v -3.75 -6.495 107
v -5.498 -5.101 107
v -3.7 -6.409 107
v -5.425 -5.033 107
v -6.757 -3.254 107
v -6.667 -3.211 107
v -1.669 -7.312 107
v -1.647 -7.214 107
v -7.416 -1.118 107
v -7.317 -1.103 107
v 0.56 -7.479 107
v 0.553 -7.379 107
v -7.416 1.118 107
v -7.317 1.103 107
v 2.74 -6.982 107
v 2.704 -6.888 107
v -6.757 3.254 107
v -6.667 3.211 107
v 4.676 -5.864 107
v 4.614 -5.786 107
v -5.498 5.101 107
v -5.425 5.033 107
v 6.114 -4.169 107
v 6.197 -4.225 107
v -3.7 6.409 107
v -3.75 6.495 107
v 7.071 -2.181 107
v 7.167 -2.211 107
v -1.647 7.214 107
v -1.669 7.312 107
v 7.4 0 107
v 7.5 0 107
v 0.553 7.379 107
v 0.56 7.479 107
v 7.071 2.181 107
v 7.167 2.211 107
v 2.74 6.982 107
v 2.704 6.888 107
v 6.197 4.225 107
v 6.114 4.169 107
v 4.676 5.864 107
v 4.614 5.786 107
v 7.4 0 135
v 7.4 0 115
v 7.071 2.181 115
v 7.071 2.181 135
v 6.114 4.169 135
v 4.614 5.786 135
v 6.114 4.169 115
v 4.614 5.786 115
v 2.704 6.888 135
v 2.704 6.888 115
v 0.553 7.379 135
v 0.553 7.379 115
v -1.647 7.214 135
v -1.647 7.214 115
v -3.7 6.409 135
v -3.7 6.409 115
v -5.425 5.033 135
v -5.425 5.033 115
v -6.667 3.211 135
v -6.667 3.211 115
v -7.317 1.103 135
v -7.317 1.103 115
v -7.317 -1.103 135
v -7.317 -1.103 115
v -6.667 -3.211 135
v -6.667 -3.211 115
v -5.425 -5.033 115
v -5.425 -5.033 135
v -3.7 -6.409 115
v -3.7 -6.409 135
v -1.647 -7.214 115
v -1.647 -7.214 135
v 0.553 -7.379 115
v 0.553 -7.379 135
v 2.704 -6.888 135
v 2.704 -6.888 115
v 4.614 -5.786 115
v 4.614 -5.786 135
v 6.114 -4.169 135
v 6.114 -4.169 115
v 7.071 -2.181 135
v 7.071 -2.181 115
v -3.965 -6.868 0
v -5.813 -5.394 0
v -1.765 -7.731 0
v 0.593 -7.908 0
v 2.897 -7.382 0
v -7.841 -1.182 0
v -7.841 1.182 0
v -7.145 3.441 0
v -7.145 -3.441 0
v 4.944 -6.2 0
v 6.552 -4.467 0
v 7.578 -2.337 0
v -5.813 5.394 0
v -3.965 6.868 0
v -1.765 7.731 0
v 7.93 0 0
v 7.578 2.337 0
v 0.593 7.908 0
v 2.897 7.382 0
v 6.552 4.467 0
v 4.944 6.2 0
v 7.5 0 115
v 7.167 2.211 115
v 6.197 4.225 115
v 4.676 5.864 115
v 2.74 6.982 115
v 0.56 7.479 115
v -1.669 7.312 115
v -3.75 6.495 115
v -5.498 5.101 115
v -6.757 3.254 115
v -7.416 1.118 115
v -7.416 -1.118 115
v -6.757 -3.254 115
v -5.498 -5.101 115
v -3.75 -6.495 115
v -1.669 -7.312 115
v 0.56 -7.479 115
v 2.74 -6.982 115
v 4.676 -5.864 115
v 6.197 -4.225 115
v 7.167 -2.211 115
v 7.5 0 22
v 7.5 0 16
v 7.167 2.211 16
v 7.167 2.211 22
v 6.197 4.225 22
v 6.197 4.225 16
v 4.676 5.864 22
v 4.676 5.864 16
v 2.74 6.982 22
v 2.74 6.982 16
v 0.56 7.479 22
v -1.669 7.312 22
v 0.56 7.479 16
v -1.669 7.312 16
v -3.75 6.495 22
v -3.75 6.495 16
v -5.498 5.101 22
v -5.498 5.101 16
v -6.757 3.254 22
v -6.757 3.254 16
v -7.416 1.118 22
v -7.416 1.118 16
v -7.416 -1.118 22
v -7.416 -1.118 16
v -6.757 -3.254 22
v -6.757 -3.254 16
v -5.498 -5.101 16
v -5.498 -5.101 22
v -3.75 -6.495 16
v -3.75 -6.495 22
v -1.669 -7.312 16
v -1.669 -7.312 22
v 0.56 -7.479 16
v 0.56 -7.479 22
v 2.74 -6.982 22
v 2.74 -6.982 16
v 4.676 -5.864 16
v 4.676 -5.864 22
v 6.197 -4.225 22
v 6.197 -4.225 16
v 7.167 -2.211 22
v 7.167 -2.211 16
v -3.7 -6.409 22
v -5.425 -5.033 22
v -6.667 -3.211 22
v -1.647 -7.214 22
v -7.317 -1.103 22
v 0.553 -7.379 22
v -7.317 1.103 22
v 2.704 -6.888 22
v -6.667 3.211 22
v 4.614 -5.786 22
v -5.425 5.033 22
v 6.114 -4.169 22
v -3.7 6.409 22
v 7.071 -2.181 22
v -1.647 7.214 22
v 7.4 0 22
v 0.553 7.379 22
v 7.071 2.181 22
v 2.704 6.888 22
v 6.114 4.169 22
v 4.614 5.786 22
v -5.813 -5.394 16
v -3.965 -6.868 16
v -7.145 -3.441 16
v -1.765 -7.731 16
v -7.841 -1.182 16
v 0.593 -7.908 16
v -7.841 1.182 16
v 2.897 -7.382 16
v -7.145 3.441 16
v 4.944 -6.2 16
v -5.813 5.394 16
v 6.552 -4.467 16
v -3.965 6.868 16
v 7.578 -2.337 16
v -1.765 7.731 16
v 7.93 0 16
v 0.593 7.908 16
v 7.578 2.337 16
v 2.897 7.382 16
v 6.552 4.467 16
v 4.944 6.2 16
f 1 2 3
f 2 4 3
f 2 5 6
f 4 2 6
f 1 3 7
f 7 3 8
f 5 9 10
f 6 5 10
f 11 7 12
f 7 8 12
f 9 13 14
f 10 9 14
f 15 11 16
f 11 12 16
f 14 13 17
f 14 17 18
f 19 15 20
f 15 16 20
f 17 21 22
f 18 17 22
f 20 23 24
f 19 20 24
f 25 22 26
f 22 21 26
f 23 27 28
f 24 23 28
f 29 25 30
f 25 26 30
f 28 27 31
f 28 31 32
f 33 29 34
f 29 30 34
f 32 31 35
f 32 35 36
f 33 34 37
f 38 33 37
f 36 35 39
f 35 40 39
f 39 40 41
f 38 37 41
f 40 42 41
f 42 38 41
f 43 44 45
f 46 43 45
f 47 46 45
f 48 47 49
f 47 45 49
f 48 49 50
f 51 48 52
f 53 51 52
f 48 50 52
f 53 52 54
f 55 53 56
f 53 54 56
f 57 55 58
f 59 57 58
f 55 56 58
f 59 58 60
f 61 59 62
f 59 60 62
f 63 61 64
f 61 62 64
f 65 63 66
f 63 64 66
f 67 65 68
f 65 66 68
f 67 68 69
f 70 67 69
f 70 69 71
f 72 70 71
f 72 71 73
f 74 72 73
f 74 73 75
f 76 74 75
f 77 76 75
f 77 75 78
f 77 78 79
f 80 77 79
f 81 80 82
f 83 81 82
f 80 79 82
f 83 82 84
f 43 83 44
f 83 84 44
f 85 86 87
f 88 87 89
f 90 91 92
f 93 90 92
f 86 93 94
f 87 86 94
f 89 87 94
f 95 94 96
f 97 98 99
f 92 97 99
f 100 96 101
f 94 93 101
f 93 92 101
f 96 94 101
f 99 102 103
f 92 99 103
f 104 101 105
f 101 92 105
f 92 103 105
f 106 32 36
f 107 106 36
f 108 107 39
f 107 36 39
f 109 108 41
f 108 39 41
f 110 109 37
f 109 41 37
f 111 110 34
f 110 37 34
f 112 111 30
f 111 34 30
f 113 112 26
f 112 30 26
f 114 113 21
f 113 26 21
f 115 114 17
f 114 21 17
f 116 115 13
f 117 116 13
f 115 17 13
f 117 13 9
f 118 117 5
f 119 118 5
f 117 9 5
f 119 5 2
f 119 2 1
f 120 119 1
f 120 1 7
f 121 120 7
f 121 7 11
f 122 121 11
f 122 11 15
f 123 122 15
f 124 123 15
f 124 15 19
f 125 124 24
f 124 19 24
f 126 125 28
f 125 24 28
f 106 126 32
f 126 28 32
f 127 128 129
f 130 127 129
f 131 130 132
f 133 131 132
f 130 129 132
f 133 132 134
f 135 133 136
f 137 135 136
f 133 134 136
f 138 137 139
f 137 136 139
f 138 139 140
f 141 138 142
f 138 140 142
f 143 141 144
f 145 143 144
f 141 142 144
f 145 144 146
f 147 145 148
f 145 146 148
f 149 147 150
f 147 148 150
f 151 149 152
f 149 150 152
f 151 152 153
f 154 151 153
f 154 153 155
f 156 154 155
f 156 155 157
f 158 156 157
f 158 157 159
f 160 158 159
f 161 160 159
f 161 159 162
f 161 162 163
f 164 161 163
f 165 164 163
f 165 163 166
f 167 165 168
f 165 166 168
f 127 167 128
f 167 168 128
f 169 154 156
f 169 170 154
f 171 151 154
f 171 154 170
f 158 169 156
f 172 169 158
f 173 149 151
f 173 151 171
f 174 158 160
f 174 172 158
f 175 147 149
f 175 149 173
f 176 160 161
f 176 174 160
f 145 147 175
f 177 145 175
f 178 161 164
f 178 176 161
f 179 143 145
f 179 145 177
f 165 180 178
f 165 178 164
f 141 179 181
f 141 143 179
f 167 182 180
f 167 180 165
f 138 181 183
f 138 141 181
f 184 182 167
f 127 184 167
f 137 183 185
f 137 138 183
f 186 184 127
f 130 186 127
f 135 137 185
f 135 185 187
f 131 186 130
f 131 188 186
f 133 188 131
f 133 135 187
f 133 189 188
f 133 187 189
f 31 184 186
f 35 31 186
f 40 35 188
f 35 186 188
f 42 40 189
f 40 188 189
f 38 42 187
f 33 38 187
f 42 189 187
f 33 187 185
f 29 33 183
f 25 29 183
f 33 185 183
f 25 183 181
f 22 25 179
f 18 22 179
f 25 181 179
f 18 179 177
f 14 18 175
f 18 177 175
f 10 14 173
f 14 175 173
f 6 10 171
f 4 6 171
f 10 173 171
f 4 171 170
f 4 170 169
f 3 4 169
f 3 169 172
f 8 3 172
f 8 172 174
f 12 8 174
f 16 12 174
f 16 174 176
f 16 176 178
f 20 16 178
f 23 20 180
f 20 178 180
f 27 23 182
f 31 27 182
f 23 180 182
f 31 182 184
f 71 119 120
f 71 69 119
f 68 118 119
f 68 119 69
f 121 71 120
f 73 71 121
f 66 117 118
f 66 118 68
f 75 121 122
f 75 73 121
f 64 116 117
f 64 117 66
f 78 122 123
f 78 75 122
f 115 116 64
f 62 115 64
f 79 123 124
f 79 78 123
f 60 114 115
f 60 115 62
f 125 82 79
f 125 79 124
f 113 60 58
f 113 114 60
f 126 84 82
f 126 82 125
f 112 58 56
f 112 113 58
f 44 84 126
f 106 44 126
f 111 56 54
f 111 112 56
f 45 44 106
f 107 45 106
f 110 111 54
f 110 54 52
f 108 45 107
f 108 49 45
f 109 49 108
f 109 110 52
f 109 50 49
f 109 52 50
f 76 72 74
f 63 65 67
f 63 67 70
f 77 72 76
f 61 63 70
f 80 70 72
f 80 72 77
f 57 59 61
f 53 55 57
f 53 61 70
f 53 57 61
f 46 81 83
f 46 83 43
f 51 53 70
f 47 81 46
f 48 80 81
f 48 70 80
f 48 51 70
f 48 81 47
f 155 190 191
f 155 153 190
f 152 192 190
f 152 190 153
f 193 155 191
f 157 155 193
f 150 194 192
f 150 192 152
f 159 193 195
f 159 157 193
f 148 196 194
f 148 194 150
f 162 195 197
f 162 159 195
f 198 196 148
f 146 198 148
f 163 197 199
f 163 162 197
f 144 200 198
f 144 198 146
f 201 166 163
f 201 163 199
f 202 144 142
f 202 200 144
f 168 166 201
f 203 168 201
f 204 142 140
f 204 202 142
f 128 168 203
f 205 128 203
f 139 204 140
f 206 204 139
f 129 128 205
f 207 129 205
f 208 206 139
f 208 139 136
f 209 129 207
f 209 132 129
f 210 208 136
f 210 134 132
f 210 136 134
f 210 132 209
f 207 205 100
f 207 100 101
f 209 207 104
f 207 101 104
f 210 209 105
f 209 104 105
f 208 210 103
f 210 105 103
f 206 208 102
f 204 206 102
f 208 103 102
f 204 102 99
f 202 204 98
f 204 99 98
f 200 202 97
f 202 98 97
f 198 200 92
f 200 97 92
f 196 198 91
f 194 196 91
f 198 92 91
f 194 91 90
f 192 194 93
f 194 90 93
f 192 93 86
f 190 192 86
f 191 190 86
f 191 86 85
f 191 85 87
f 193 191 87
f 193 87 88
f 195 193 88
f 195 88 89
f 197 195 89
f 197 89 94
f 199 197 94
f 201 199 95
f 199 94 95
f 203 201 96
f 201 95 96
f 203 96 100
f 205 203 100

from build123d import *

# Parameters (mm, degrees)
SKETCH004_R  = 7.93
PAD_DEPTH    = 16
SKETCH005_R  = 7.5
PAD001_DEPTH = 6
SKETCH006_R  = 7.4
PAD002_DEPTH = 85
SKETCH007_R  = 7.5
PAD003_DEPTH = 8
SKETCH008_R  = 7.4
PAD004_DEPTH = 20


with BuildPart() as part:
    # Sketch004 → Pad (new body)
    with BuildSketch(Plane.XY):
        Circle(SKETCH004_R)
    extrude(amount=PAD_DEPTH)

    # Sketch005 → Pad001 (new body)
    with BuildSketch(Plane.XY.offset(16)):
        Circle(SKETCH005_R)
    extrude(amount=PAD001_DEPTH)

    # Sketch006 → Pad002 (new body)
    with BuildSketch(Plane.XY.offset(22)):
        Circle(SKETCH006_R)
    extrude(amount=PAD002_DEPTH)

    # Sketch007 → Pad003 (new body)
    with BuildSketch(Plane.XY.offset(107)):
        Circle(SKETCH007_R)
    extrude(amount=PAD003_DEPTH)

    # Sketch008 → Pad004 (new body)
    with BuildSketch(Plane.XY.offset(115)):
        Circle(SKETCH008_R)
    extrude(amount=PAD004_DEPTH)


solid = part.part
